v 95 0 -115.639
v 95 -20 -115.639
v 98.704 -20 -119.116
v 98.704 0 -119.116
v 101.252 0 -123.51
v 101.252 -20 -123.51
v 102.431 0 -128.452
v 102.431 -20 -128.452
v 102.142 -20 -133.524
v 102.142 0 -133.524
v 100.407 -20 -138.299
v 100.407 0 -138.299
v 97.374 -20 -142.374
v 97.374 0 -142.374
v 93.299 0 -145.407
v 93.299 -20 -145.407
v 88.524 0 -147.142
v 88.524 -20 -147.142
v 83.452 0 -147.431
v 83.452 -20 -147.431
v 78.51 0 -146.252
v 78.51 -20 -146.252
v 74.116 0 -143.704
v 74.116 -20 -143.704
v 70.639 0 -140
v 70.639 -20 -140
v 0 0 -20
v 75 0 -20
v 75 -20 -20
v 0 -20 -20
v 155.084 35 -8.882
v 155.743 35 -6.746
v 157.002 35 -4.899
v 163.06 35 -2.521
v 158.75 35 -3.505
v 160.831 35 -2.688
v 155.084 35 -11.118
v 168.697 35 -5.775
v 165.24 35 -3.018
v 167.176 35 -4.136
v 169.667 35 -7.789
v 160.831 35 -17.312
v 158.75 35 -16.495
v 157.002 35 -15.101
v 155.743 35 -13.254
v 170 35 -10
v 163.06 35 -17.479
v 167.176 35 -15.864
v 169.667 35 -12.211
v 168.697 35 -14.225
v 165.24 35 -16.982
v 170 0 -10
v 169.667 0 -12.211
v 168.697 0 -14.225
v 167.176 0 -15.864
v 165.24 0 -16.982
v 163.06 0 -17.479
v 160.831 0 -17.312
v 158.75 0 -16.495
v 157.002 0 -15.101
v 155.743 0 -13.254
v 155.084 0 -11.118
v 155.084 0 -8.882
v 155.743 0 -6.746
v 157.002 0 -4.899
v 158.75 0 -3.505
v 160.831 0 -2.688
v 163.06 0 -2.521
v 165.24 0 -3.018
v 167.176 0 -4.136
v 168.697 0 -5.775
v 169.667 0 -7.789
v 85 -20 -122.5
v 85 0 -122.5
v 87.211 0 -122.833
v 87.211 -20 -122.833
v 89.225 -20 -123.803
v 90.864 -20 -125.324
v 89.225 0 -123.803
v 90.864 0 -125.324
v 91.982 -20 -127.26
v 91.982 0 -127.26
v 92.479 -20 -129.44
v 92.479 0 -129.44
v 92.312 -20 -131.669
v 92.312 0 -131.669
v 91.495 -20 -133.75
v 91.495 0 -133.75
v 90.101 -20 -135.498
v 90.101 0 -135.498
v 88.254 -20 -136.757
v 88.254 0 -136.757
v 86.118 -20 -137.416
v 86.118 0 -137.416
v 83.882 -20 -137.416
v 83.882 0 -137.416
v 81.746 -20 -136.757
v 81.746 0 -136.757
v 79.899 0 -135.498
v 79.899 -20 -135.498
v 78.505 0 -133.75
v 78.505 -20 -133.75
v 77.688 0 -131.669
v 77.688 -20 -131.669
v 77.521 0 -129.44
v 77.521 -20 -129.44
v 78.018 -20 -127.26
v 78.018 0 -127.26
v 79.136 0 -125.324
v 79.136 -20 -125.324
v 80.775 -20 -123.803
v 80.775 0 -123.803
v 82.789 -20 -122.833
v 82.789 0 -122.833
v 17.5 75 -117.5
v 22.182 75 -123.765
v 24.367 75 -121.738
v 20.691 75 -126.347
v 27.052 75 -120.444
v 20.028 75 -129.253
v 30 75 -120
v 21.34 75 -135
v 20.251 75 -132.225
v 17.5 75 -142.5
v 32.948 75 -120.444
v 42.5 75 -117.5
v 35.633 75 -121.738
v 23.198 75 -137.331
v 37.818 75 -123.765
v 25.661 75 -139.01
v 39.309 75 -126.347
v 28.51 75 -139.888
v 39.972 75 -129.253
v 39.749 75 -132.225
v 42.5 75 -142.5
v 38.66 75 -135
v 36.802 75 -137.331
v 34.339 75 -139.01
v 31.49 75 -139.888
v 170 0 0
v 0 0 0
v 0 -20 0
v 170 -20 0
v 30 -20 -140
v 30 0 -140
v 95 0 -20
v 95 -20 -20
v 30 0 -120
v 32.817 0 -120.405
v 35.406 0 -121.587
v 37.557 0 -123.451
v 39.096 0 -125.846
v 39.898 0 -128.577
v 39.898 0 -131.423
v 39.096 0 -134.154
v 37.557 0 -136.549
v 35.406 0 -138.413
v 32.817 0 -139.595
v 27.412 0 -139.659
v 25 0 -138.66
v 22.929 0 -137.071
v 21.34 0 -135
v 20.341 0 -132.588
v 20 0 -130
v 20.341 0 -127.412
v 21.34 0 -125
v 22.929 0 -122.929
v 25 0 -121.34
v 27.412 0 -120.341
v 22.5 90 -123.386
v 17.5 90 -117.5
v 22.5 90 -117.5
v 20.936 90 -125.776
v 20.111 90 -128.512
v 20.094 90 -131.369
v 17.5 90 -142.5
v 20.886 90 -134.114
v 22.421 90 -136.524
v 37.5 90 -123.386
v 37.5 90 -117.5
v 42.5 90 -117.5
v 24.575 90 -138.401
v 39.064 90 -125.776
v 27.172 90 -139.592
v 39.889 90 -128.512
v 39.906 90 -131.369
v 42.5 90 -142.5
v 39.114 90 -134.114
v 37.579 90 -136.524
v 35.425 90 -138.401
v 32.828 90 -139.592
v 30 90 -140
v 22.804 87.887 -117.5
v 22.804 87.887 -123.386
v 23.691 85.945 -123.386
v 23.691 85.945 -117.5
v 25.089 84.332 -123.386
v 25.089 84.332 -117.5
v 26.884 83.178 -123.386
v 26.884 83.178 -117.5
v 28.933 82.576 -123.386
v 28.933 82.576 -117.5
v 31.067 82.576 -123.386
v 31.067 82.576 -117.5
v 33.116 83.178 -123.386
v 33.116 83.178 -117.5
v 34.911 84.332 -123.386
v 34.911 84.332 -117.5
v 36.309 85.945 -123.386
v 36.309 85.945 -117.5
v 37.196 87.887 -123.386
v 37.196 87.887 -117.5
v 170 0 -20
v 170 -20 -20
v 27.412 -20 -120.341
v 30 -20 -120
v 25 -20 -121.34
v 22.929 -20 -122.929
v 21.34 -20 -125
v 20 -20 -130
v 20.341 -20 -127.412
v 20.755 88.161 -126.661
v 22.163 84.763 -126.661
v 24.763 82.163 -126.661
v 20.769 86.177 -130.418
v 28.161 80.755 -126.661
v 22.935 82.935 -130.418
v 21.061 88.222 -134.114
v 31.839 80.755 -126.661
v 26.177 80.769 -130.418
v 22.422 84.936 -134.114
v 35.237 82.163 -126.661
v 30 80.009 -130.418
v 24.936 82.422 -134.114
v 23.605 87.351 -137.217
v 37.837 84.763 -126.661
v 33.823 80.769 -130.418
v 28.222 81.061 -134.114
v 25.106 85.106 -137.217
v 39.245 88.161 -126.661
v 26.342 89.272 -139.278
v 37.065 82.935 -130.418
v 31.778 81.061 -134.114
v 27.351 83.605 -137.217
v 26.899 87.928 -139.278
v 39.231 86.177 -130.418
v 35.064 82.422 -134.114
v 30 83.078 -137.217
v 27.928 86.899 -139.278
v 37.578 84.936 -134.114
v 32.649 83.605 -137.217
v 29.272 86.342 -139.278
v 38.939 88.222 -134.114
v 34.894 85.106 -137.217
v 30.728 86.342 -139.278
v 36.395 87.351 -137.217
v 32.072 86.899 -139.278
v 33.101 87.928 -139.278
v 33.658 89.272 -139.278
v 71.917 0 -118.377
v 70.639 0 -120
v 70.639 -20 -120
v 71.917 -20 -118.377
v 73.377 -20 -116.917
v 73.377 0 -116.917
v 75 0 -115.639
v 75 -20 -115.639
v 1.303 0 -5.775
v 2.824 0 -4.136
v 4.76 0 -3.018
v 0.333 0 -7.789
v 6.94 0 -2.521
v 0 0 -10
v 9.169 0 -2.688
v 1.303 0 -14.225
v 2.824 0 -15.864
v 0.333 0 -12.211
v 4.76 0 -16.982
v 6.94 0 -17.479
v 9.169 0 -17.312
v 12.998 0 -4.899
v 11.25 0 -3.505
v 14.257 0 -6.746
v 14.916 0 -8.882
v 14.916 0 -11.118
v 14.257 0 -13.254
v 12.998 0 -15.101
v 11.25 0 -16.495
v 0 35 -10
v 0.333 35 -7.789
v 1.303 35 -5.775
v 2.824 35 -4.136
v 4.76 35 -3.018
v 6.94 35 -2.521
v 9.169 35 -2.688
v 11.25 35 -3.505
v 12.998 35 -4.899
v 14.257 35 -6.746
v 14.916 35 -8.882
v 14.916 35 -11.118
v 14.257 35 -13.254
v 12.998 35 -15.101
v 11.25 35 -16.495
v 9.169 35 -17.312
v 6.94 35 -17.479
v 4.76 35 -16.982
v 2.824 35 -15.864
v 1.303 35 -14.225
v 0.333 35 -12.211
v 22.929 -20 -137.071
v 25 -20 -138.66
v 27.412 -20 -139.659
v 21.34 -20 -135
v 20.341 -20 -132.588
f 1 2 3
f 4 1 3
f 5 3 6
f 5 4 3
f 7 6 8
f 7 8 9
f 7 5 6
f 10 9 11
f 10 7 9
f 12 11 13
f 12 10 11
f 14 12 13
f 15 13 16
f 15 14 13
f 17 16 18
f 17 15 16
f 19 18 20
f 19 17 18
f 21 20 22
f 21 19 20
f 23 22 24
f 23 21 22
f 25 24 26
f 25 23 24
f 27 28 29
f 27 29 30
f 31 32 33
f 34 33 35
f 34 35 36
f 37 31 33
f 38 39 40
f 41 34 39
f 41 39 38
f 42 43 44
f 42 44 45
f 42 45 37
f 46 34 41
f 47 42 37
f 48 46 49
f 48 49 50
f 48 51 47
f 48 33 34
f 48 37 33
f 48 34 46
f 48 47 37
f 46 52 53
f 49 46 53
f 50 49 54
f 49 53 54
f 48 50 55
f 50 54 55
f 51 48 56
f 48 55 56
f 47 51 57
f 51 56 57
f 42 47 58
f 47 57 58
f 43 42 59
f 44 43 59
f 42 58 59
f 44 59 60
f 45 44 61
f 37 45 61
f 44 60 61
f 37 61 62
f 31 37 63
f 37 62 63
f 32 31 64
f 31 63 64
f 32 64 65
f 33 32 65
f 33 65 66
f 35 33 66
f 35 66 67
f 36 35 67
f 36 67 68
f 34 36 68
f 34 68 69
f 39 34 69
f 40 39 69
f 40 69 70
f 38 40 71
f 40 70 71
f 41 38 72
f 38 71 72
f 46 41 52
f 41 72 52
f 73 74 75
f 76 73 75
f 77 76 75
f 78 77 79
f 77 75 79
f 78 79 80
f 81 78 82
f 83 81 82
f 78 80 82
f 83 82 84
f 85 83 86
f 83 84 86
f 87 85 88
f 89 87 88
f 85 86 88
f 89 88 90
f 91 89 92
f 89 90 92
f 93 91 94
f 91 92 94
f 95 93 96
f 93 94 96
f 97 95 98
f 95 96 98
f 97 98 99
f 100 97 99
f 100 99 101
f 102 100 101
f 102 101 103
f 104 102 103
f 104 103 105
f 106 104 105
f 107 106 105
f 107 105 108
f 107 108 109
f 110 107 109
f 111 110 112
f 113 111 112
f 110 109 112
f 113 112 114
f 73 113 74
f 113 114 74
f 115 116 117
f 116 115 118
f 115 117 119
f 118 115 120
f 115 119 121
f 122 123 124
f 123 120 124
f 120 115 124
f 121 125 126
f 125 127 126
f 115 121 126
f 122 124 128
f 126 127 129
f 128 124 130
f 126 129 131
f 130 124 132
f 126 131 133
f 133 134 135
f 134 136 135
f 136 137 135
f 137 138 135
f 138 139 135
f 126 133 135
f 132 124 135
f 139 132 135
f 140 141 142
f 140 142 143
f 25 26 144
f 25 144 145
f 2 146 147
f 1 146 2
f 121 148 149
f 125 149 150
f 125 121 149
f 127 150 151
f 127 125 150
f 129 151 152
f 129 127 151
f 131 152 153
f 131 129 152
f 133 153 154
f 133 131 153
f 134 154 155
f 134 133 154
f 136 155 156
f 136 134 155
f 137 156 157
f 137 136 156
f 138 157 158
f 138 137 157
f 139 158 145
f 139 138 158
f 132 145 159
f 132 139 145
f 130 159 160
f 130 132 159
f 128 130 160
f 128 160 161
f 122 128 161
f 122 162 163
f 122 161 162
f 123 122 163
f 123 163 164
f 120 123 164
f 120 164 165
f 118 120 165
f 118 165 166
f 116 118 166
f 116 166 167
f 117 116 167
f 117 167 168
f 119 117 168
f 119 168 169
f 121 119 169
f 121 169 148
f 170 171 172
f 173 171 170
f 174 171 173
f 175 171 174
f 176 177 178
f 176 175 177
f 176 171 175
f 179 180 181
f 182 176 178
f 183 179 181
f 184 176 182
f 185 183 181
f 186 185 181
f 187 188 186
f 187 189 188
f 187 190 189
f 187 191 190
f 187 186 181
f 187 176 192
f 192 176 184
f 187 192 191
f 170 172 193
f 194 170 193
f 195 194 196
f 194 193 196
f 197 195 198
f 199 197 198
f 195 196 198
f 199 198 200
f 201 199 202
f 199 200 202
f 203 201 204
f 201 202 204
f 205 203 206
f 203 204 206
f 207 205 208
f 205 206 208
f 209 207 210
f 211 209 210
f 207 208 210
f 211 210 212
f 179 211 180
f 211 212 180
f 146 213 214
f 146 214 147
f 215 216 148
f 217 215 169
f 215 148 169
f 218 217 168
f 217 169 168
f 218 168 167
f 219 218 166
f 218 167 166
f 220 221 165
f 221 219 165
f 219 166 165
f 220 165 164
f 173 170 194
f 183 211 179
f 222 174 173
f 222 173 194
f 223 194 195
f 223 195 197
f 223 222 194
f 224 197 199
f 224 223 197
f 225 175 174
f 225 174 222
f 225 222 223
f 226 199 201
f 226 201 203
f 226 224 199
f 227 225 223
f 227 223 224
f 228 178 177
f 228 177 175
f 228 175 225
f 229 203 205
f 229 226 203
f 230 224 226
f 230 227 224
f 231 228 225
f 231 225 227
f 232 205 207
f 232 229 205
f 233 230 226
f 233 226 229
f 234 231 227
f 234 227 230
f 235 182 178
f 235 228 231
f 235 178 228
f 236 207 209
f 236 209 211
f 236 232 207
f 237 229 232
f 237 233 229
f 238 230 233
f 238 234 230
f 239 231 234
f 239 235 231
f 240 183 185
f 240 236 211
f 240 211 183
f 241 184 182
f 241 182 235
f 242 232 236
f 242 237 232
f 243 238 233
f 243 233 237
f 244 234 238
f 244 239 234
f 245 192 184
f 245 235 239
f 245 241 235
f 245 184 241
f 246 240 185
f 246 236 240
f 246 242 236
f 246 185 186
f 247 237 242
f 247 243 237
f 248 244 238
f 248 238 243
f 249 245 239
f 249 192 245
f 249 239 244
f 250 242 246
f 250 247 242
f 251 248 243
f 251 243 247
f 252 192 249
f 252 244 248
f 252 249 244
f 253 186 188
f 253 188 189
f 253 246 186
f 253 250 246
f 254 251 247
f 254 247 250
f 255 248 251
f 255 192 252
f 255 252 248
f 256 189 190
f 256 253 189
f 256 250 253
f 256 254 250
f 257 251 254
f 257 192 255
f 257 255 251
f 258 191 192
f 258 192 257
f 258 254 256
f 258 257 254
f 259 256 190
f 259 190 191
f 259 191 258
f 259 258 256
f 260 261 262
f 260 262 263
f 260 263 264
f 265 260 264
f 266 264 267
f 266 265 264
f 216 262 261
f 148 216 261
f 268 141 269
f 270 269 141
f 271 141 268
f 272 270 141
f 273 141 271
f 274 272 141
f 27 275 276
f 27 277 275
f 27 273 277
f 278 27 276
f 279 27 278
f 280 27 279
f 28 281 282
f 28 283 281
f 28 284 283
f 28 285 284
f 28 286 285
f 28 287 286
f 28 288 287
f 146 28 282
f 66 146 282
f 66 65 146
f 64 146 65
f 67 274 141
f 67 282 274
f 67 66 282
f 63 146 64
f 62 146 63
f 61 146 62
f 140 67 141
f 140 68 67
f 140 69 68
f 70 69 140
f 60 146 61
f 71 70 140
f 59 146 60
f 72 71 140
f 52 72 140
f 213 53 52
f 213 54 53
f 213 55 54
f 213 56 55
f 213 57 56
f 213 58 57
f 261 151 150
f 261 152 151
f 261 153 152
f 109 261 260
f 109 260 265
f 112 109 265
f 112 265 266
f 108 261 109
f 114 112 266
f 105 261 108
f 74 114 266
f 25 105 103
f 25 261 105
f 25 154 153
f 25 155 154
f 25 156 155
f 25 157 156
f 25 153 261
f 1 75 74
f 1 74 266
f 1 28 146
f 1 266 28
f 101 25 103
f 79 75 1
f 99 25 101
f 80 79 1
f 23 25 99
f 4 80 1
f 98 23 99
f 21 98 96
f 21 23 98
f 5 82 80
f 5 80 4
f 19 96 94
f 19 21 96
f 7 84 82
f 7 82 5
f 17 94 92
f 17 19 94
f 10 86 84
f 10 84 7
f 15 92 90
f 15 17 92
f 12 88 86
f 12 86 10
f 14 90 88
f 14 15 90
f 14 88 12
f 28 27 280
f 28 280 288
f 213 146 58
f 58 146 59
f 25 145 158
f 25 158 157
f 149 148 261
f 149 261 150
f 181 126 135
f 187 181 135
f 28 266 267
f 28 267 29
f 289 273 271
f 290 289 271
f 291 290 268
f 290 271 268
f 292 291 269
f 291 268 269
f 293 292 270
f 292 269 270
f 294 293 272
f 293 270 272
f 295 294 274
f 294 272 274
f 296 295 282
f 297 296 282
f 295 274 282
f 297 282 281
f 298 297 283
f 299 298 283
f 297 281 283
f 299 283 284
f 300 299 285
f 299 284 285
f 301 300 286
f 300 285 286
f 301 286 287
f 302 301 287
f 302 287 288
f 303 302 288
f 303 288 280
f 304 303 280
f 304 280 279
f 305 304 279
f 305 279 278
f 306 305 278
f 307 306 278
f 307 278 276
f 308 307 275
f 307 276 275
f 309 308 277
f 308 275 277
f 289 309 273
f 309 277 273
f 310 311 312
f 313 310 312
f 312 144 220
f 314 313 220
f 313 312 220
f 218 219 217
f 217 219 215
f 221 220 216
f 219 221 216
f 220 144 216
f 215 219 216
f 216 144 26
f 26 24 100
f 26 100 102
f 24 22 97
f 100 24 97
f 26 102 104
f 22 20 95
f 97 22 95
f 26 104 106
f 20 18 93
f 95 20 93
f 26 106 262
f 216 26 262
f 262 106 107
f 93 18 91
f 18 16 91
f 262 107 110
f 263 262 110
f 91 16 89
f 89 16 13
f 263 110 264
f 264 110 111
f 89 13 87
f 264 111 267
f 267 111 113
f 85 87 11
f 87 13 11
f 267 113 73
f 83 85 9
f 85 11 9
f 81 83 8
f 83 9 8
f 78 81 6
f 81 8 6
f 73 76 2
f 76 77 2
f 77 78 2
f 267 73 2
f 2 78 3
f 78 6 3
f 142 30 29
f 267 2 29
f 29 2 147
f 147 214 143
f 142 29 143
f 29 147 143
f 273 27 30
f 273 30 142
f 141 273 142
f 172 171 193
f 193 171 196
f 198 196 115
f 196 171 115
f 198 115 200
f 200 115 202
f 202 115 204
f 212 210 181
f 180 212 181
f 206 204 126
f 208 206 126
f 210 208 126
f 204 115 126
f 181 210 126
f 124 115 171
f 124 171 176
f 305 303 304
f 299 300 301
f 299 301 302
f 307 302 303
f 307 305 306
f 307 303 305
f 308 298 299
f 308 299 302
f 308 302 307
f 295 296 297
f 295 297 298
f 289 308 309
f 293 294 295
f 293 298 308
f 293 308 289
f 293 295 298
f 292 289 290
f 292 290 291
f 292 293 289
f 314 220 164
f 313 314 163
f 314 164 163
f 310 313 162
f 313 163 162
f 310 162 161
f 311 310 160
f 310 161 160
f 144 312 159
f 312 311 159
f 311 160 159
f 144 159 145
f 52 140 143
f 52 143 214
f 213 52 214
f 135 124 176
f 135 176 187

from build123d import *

# Parameters (mm, degrees)
SKETCH1_R            = 7.5
BOSS_EXTRUDE9_DEPTH  = 20
SKETCH3_R            = 7.5
BOSS_EXTRUDE10_DEPTH = 35
SKETCH5_W            = 20
SKETCH5_H            = 20
BOSS_EXTRUDE11_DEPTH = 55
CUT_EXTRUDE2_DEPTH   = 228.774559598
BOSS_EXTRUDE13_START = 75
SKETCH10_R           = 10
BOSS_EXTRUDE13_DEPTH = 75
SKETCH12_W           = 25
SKETCH12_H           = 25
BOSS_EXTRUDE14_DEPTH = 15
SKETCH21_R           = 7.5
CUT_EXTRUDE8_DEPTH   = 8


with BuildPart() as part:
    # Sketch1 → Boss-Extrude9 (new body)
    with BuildSketch(Plane(origin=(0, 0, 0), x_dir=(1, 0, 0), z_dir=(0, 1, 0))):
        with BuildLine():
            Line((0, 0), (170, 0))
            Line((170, 0), (170, 20))
            Line((170, 20), (95, 20))
            Line((95, 20), (95, 115.638593384))
            ThreePointArc((95, 115.638593384), (85, 147.5), (75, 115.638593384))
            Line((75, 115.638593384), (75, 20))
            Line((75, 20), (0, 20))
            Line((0, 20), (0, 0))
        make_face()
        with Locations(Location((85, 130, 0), (0, 0, 270))):
            Circle(SKETCH1_R, mode=Mode.SUBTRACT)
    extrude(amount=-BOSS_EXTRUDE9_DEPTH)

    # Sketch3 → Boss-Extrude10 (add)
    with BuildSketch(Plane(origin=(0, 0, 0), x_dir=(1, 0, 0), z_dir=(0, 1, 0))):
        with Locations(Location((7.5, 10, 0), (0, 0, 180))):
            Circle(SKETCH3_R)
        with Locations((162.5, 10)):
            Circle(SKETCH3_R)
    extrude(amount=BOSS_EXTRUDE10_DEPTH)

    # Sketch5 → Boss-Extrude11 (add)
    with BuildSketch(Plane.ZY.offset(-75)):
        with Locations((-130, -10)):
            Rectangle(SKETCH5_W, SKETCH5_H)
    extrude(amount=BOSS_EXTRUDE11_DEPTH)

    # Sketch6 → Cut-Extrude2 (cut, through all)
    with BuildSketch(Plane(origin=(0, 0, 0), x_dir=(1, 0, 0), z_dir=(0, 1, 0))):
        with BuildLine():
            Line((20, 130), (20, 120))
            Line((20, 120), (30, 120))
            ThreePointArc((30, 120), (22.928932188, 122.928932188), (20, 130))
        make_face()
        with BuildLine():
            Line((20, 140), (20, 130))
            ThreePointArc((20, 130), (22.928932188, 137.071067812), (30, 140))
            Line((30, 140), (20, 140))
        make_face()
    extrude(amount=-CUT_EXTRUDE2_DEPTH, mode=Mode.SUBTRACT)

    # Sketch10 → Boss-Extrude13 (add)
    with BuildSketch(Plane(origin=(0, 0, 0), x_dir=(1, 0, 0), z_dir=(0, 1, 0)).offset(BOSS_EXTRUDE13_START)):
        with Locations(Location((30, 130, 0), (0, 0, 270))):
            Circle(SKETCH10_R)
    extrude(amount=-BOSS_EXTRUDE13_DEPTH)

    # Sketch12 → Boss-Extrude14 (add)
    with BuildSketch(Plane(origin=(0, 75, 0), x_dir=(1, 0, 0), z_dir=(0, 1, 0))):
        with Locations((30, 130)):
            Rectangle(SKETCH12_W, SKETCH12_H)
    extrude(amount=BOSS_EXTRUDE14_DEPTH)

    # Sketch20 → Cut-Revolve5 (revolve, cut)
    with BuildSketch(Plane(origin=(0, 90, 0), x_dir=(1, 0, 0), z_dir=(0, 1, 0))):
        with BuildLine():
            Line((30, 140), (30, 120))
            ThreePointArc((30, 120), (40, 130), (30, 140))
        make_face()
    revolve(axis=Axis((30, 90, -140), (0, 0, 1)), mode=Mode.SUBTRACT)

    # Sketch21 → Cut-Extrude8 (cut)
    with BuildSketch(Plane.XY.offset(-117.5)):
        with Locations((30, 90)):
            Circle(SKETCH21_R)
    extrude(amount=-CUT_EXTRUDE8_DEPTH, mode=Mode.SUBTRACT)


solid = part.part
